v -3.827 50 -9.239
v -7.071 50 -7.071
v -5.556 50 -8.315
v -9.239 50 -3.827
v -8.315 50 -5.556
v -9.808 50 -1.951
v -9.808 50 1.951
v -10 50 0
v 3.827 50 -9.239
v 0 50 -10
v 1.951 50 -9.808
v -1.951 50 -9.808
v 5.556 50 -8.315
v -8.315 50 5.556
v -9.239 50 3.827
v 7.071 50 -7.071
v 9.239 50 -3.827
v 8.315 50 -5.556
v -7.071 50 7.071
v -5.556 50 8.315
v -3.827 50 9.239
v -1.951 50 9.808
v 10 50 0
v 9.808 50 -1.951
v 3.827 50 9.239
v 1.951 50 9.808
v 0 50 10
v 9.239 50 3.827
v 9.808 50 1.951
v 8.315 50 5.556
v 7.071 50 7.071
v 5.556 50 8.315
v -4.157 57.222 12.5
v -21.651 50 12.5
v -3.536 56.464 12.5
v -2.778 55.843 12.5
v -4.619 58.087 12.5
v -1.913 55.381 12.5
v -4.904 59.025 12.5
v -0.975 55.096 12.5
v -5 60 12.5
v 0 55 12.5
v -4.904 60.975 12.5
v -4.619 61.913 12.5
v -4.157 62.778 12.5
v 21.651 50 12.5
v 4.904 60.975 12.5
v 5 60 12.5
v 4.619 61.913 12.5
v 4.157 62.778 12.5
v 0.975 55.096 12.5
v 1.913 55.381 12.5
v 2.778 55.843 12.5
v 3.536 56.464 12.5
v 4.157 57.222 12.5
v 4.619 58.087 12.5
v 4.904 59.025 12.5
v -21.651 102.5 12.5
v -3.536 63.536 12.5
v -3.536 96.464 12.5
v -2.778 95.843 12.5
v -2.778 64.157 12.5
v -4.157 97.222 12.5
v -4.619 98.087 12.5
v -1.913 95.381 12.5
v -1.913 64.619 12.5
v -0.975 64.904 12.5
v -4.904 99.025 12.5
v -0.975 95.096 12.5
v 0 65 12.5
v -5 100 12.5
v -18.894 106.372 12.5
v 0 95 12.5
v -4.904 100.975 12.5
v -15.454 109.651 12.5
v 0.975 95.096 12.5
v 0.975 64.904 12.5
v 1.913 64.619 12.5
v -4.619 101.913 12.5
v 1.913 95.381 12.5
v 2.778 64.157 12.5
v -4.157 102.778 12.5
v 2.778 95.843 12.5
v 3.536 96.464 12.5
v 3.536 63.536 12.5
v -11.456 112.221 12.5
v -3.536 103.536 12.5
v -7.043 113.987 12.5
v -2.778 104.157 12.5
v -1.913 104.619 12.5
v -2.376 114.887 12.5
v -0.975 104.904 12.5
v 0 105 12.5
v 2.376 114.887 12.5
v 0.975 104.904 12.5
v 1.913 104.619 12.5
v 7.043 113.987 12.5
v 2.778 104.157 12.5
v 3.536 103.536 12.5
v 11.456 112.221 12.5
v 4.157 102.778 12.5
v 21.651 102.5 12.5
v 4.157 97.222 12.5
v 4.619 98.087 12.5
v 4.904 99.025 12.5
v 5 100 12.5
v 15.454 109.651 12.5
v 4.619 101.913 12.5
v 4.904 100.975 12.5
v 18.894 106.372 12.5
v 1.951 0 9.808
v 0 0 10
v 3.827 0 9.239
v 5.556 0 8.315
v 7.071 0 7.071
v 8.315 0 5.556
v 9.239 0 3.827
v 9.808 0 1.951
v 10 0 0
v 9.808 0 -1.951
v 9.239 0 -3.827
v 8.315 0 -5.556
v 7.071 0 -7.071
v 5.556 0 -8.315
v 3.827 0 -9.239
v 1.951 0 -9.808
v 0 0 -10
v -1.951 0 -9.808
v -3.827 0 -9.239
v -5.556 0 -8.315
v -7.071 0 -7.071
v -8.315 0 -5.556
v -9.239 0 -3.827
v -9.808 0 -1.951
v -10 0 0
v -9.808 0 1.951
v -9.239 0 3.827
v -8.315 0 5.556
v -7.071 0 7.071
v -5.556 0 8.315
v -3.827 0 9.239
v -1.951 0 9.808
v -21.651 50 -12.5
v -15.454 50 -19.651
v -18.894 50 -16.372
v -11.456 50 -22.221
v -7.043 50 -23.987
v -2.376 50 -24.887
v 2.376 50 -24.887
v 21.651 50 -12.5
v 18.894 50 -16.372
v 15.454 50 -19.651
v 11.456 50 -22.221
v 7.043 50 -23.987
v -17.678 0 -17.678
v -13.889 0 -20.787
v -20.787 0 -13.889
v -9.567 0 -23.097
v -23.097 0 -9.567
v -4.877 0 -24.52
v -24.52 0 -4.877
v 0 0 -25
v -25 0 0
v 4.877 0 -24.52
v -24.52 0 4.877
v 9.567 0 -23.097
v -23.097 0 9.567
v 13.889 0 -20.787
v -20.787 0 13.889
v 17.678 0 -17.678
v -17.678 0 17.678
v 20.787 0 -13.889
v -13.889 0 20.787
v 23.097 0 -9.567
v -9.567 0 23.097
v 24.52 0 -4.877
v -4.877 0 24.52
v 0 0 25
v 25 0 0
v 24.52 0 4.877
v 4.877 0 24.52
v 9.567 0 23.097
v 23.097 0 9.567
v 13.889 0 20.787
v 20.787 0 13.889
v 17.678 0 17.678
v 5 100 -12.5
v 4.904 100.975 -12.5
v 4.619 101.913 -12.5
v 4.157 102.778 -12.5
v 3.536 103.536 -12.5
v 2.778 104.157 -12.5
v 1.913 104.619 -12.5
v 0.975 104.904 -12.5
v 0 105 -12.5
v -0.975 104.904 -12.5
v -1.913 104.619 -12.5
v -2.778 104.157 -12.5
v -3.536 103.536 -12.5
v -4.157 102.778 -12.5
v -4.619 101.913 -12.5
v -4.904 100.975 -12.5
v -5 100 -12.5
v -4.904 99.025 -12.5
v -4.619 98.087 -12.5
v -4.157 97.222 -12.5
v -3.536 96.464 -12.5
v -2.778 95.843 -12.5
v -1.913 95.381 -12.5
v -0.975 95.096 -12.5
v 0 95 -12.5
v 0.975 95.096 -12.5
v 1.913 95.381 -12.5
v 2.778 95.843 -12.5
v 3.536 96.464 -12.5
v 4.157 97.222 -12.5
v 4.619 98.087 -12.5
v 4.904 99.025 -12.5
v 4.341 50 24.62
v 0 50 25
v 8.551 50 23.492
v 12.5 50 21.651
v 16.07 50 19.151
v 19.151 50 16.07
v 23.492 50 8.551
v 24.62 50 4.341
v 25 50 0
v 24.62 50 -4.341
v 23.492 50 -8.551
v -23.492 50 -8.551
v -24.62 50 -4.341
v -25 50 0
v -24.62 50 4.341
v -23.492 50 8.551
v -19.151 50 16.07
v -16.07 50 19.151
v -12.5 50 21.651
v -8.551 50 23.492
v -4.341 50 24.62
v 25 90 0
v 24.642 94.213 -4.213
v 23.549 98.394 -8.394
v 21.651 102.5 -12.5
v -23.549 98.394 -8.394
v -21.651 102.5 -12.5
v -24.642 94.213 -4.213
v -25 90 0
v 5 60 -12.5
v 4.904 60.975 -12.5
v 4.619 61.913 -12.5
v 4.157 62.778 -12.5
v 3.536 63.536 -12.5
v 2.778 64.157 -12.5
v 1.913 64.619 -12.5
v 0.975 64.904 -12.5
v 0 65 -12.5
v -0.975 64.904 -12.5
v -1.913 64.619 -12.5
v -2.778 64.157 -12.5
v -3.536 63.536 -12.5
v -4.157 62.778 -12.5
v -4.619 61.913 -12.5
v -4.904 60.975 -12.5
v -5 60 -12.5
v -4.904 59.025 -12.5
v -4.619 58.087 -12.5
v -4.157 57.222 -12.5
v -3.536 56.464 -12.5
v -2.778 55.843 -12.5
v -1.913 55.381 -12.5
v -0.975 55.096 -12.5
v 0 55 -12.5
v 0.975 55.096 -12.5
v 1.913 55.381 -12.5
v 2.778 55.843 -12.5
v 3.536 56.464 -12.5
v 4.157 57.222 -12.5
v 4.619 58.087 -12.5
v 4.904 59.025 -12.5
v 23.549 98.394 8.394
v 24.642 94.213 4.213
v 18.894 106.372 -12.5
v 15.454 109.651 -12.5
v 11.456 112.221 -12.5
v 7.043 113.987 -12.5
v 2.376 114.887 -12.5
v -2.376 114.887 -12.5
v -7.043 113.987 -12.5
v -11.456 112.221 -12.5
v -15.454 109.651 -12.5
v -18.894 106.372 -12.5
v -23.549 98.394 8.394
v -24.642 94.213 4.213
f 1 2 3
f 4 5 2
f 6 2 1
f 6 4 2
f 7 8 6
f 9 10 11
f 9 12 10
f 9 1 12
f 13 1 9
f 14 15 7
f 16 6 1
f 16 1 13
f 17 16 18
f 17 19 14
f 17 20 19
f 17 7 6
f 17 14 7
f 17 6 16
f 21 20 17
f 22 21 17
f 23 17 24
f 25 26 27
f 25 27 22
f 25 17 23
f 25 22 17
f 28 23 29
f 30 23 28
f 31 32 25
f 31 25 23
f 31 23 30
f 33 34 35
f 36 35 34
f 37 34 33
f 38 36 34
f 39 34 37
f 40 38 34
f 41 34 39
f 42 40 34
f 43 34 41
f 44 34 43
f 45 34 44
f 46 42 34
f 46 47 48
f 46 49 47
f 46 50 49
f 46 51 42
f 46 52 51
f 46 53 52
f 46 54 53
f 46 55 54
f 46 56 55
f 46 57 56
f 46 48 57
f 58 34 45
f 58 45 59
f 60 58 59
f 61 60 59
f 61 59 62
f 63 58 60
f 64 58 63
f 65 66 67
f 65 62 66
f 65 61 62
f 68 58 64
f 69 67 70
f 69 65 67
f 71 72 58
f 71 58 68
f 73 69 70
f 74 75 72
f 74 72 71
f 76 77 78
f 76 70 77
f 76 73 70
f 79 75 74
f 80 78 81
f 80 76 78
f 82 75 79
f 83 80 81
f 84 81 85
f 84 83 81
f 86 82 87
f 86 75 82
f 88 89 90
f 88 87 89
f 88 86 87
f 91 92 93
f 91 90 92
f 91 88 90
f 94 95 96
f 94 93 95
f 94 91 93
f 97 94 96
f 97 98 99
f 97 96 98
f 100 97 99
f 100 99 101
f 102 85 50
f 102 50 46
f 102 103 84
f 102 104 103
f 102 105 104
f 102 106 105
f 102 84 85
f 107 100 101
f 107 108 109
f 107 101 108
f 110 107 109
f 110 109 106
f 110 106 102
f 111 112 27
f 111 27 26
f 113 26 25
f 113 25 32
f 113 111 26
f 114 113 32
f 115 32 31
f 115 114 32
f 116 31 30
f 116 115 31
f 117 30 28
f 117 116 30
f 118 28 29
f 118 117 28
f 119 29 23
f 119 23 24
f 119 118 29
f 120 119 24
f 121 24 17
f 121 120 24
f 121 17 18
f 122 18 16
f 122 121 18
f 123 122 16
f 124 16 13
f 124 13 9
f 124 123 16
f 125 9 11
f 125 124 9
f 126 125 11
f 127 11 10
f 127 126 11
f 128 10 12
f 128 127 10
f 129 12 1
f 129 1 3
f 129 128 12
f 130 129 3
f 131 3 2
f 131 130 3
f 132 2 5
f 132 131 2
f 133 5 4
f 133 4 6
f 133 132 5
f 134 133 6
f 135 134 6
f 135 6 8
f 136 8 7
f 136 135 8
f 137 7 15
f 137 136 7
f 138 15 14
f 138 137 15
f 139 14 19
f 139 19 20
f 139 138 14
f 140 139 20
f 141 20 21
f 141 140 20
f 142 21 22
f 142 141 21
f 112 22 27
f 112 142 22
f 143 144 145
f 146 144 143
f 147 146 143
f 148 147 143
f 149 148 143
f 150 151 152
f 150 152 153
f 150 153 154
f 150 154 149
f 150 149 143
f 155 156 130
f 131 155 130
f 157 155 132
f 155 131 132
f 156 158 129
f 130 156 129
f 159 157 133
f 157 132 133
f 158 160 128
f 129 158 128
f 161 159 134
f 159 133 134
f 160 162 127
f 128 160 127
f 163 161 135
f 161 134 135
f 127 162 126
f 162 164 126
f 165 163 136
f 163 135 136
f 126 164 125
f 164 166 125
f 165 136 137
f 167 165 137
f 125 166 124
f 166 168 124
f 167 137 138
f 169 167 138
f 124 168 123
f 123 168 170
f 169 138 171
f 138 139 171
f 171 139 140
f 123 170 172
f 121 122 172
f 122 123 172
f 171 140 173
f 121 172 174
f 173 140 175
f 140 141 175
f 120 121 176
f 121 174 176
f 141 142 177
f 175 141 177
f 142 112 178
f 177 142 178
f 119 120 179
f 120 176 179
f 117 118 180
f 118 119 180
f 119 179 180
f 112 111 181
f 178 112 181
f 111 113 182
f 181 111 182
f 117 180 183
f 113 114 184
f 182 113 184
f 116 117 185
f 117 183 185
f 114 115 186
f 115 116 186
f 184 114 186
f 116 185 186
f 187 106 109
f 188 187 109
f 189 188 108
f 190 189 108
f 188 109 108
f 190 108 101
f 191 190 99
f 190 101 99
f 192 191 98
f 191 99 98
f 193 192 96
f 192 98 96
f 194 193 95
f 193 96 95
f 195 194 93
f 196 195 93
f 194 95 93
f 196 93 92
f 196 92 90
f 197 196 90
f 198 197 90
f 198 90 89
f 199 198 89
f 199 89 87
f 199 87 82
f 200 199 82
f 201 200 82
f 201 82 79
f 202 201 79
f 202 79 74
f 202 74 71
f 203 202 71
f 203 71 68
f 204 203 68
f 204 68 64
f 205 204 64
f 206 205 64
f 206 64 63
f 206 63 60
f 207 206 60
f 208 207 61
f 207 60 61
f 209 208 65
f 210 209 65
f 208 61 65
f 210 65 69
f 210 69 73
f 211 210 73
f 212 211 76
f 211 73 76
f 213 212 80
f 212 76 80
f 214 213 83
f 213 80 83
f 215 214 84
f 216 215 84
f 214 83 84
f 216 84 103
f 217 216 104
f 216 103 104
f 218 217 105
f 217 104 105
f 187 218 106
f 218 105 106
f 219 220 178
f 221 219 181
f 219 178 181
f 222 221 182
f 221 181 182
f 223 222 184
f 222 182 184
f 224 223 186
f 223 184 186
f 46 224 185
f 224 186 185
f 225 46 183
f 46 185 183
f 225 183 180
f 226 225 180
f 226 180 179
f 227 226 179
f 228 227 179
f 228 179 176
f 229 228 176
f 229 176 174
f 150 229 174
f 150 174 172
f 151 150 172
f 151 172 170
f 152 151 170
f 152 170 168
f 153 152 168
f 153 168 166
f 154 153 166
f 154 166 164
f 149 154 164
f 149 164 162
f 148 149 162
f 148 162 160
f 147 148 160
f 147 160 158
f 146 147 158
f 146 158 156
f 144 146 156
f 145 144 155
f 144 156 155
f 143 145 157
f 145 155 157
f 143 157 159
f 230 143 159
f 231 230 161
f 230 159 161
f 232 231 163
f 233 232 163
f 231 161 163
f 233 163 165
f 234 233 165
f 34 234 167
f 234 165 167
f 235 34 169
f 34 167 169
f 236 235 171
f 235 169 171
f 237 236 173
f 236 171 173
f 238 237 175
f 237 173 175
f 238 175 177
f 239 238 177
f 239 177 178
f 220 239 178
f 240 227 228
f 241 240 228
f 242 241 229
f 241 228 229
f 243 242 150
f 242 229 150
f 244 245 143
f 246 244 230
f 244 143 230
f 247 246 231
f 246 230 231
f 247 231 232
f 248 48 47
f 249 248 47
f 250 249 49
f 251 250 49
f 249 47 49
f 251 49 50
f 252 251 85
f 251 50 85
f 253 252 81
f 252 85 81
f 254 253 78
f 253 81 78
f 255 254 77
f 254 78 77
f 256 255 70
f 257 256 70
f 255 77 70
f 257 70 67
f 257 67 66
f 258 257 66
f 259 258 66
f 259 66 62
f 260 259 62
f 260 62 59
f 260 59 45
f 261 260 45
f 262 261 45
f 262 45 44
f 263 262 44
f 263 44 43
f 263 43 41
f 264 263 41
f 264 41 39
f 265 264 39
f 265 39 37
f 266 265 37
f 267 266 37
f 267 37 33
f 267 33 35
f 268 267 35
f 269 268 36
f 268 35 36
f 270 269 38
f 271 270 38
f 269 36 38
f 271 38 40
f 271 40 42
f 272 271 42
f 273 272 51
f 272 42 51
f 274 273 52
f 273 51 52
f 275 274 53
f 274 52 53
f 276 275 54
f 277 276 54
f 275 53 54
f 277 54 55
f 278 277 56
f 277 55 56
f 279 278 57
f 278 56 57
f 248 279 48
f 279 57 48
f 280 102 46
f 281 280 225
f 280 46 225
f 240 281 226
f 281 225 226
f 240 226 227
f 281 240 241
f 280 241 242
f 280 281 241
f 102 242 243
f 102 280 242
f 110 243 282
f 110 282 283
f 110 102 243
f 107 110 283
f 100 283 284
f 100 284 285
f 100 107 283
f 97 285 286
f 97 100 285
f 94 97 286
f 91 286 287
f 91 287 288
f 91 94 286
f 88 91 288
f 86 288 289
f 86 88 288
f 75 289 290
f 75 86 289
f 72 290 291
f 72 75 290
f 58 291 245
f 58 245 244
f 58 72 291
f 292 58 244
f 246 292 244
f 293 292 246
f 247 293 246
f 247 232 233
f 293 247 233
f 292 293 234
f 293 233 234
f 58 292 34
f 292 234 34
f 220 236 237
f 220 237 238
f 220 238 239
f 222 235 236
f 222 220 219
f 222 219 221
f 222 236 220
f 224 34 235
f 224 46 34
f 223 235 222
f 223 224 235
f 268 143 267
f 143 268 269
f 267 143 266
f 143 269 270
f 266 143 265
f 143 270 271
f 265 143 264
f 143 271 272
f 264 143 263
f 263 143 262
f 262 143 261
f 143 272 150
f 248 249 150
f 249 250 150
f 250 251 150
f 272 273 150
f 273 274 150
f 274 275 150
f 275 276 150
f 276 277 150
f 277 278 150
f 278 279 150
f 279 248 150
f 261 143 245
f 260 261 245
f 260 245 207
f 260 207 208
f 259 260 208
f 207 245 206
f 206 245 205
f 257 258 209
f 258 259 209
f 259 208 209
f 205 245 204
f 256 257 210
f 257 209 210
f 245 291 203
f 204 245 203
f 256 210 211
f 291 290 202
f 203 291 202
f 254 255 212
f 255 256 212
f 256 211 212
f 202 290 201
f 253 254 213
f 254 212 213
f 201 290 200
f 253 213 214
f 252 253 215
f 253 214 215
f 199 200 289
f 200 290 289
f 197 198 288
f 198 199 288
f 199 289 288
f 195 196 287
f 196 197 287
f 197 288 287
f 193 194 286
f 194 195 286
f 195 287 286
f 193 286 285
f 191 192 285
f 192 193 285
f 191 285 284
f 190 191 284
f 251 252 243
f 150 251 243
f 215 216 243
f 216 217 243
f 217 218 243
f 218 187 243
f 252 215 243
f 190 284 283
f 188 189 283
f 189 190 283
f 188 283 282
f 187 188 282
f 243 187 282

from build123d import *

# Parameters (mm, degrees)
SKETCH_1_R          = 25
SKETCH_1_R_2        = 10
EXTRUDE_1_DEPTH     = 50
EXTRUDE_2_DEPTH     = 12.5
CUT_EXTRUDE_1_DEPTH = 74.993242935
SKETCH_5_R          = 5
CUT_EXTRUDE_2_DEPTH = 124.51619327


with BuildPart() as part:
    # 草图1 → 凸台-拉伸1 (new body)
    with BuildSketch(Plane(origin=(0, 0, 0), x_dir=(1, 0, 0), z_dir=(0, 1, 0))):
        with Locations(Location((0, 0, 0), (0, 0, 270))):
            Circle(SKETCH_1_R)
        with Locations(Location((0, 0, 0), (0, 0, 270))):
            Circle(SKETCH_1_R_2, mode=Mode.SUBTRACT)
    extrude(amount=EXTRUDE_1_DEPTH)

    # 草图2 → 凸台-拉伸2 (add, symmetric)
    with BuildSketch(Plane.XY):
        with BuildLine():
            Line((-25, 50), (25, 50))
            Line((25, 50), (25, 90))
            ThreePointArc((25, 90), (0, 115), (-25, 90))
            Line((-25, 90), (-25, 50))
        make_face()
    extrude(amount=EXTRUDE_2_DEPTH, both=True)

    # 草图4 → 切除-拉伸1 (cut, through all)
    with BuildSketch(Plane.XZ.offset(-50)):
        with BuildLine():
            Line((21.650635095, -12.5), (25, -12.5))
            Line((25, -12.5), (25, 0))
            ThreePointArc((25, 0), (24.148145657, -6.470476128), (21.650635095, -12.5))
        make_face()
        with BuildLine():
            ThreePointArc((21.650635095, 12.5), (24.148145657, 6.470476128), (25, 0))
            Line((25, 0), (25, 12.5))
            Line((25, 12.5), (21.650635095, 12.5))
        make_face()
        with BuildLine():
            Line((-25, 0), (-25, -12.5))
            Line((-25, -12.5), (-21.650635095, -12.5))
            ThreePointArc((-21.650635095, -12.5), (-24.148145657, -6.470476128), (-25, 0))
        make_face()
        with BuildLine():
            Line((-25, 12.5), (-25, 0))
            ThreePointArc((-25, 0), (-24.148145657, 6.470476128), (-21.650635095, 12.5))
            Line((-21.650635095, 12.5), (-25, 12.5))
        make_face()
    extrude(amount=-CUT_EXTRUDE_1_DEPTH, mode=Mode.SUBTRACT)

    # 草图5 → 切除-拉伸2 (cut, through all)
    with BuildSketch(Plane.XY.offset(12.5)):
        with Locations((0, 100)):
            Circle(SKETCH_5_R)
        with Locations((0, 60)):
            Circle(SKETCH_5_R)
    extrude(amount=-CUT_EXTRUDE_2_DEPTH, mode=Mode.SUBTRACT)


solid = part.part
